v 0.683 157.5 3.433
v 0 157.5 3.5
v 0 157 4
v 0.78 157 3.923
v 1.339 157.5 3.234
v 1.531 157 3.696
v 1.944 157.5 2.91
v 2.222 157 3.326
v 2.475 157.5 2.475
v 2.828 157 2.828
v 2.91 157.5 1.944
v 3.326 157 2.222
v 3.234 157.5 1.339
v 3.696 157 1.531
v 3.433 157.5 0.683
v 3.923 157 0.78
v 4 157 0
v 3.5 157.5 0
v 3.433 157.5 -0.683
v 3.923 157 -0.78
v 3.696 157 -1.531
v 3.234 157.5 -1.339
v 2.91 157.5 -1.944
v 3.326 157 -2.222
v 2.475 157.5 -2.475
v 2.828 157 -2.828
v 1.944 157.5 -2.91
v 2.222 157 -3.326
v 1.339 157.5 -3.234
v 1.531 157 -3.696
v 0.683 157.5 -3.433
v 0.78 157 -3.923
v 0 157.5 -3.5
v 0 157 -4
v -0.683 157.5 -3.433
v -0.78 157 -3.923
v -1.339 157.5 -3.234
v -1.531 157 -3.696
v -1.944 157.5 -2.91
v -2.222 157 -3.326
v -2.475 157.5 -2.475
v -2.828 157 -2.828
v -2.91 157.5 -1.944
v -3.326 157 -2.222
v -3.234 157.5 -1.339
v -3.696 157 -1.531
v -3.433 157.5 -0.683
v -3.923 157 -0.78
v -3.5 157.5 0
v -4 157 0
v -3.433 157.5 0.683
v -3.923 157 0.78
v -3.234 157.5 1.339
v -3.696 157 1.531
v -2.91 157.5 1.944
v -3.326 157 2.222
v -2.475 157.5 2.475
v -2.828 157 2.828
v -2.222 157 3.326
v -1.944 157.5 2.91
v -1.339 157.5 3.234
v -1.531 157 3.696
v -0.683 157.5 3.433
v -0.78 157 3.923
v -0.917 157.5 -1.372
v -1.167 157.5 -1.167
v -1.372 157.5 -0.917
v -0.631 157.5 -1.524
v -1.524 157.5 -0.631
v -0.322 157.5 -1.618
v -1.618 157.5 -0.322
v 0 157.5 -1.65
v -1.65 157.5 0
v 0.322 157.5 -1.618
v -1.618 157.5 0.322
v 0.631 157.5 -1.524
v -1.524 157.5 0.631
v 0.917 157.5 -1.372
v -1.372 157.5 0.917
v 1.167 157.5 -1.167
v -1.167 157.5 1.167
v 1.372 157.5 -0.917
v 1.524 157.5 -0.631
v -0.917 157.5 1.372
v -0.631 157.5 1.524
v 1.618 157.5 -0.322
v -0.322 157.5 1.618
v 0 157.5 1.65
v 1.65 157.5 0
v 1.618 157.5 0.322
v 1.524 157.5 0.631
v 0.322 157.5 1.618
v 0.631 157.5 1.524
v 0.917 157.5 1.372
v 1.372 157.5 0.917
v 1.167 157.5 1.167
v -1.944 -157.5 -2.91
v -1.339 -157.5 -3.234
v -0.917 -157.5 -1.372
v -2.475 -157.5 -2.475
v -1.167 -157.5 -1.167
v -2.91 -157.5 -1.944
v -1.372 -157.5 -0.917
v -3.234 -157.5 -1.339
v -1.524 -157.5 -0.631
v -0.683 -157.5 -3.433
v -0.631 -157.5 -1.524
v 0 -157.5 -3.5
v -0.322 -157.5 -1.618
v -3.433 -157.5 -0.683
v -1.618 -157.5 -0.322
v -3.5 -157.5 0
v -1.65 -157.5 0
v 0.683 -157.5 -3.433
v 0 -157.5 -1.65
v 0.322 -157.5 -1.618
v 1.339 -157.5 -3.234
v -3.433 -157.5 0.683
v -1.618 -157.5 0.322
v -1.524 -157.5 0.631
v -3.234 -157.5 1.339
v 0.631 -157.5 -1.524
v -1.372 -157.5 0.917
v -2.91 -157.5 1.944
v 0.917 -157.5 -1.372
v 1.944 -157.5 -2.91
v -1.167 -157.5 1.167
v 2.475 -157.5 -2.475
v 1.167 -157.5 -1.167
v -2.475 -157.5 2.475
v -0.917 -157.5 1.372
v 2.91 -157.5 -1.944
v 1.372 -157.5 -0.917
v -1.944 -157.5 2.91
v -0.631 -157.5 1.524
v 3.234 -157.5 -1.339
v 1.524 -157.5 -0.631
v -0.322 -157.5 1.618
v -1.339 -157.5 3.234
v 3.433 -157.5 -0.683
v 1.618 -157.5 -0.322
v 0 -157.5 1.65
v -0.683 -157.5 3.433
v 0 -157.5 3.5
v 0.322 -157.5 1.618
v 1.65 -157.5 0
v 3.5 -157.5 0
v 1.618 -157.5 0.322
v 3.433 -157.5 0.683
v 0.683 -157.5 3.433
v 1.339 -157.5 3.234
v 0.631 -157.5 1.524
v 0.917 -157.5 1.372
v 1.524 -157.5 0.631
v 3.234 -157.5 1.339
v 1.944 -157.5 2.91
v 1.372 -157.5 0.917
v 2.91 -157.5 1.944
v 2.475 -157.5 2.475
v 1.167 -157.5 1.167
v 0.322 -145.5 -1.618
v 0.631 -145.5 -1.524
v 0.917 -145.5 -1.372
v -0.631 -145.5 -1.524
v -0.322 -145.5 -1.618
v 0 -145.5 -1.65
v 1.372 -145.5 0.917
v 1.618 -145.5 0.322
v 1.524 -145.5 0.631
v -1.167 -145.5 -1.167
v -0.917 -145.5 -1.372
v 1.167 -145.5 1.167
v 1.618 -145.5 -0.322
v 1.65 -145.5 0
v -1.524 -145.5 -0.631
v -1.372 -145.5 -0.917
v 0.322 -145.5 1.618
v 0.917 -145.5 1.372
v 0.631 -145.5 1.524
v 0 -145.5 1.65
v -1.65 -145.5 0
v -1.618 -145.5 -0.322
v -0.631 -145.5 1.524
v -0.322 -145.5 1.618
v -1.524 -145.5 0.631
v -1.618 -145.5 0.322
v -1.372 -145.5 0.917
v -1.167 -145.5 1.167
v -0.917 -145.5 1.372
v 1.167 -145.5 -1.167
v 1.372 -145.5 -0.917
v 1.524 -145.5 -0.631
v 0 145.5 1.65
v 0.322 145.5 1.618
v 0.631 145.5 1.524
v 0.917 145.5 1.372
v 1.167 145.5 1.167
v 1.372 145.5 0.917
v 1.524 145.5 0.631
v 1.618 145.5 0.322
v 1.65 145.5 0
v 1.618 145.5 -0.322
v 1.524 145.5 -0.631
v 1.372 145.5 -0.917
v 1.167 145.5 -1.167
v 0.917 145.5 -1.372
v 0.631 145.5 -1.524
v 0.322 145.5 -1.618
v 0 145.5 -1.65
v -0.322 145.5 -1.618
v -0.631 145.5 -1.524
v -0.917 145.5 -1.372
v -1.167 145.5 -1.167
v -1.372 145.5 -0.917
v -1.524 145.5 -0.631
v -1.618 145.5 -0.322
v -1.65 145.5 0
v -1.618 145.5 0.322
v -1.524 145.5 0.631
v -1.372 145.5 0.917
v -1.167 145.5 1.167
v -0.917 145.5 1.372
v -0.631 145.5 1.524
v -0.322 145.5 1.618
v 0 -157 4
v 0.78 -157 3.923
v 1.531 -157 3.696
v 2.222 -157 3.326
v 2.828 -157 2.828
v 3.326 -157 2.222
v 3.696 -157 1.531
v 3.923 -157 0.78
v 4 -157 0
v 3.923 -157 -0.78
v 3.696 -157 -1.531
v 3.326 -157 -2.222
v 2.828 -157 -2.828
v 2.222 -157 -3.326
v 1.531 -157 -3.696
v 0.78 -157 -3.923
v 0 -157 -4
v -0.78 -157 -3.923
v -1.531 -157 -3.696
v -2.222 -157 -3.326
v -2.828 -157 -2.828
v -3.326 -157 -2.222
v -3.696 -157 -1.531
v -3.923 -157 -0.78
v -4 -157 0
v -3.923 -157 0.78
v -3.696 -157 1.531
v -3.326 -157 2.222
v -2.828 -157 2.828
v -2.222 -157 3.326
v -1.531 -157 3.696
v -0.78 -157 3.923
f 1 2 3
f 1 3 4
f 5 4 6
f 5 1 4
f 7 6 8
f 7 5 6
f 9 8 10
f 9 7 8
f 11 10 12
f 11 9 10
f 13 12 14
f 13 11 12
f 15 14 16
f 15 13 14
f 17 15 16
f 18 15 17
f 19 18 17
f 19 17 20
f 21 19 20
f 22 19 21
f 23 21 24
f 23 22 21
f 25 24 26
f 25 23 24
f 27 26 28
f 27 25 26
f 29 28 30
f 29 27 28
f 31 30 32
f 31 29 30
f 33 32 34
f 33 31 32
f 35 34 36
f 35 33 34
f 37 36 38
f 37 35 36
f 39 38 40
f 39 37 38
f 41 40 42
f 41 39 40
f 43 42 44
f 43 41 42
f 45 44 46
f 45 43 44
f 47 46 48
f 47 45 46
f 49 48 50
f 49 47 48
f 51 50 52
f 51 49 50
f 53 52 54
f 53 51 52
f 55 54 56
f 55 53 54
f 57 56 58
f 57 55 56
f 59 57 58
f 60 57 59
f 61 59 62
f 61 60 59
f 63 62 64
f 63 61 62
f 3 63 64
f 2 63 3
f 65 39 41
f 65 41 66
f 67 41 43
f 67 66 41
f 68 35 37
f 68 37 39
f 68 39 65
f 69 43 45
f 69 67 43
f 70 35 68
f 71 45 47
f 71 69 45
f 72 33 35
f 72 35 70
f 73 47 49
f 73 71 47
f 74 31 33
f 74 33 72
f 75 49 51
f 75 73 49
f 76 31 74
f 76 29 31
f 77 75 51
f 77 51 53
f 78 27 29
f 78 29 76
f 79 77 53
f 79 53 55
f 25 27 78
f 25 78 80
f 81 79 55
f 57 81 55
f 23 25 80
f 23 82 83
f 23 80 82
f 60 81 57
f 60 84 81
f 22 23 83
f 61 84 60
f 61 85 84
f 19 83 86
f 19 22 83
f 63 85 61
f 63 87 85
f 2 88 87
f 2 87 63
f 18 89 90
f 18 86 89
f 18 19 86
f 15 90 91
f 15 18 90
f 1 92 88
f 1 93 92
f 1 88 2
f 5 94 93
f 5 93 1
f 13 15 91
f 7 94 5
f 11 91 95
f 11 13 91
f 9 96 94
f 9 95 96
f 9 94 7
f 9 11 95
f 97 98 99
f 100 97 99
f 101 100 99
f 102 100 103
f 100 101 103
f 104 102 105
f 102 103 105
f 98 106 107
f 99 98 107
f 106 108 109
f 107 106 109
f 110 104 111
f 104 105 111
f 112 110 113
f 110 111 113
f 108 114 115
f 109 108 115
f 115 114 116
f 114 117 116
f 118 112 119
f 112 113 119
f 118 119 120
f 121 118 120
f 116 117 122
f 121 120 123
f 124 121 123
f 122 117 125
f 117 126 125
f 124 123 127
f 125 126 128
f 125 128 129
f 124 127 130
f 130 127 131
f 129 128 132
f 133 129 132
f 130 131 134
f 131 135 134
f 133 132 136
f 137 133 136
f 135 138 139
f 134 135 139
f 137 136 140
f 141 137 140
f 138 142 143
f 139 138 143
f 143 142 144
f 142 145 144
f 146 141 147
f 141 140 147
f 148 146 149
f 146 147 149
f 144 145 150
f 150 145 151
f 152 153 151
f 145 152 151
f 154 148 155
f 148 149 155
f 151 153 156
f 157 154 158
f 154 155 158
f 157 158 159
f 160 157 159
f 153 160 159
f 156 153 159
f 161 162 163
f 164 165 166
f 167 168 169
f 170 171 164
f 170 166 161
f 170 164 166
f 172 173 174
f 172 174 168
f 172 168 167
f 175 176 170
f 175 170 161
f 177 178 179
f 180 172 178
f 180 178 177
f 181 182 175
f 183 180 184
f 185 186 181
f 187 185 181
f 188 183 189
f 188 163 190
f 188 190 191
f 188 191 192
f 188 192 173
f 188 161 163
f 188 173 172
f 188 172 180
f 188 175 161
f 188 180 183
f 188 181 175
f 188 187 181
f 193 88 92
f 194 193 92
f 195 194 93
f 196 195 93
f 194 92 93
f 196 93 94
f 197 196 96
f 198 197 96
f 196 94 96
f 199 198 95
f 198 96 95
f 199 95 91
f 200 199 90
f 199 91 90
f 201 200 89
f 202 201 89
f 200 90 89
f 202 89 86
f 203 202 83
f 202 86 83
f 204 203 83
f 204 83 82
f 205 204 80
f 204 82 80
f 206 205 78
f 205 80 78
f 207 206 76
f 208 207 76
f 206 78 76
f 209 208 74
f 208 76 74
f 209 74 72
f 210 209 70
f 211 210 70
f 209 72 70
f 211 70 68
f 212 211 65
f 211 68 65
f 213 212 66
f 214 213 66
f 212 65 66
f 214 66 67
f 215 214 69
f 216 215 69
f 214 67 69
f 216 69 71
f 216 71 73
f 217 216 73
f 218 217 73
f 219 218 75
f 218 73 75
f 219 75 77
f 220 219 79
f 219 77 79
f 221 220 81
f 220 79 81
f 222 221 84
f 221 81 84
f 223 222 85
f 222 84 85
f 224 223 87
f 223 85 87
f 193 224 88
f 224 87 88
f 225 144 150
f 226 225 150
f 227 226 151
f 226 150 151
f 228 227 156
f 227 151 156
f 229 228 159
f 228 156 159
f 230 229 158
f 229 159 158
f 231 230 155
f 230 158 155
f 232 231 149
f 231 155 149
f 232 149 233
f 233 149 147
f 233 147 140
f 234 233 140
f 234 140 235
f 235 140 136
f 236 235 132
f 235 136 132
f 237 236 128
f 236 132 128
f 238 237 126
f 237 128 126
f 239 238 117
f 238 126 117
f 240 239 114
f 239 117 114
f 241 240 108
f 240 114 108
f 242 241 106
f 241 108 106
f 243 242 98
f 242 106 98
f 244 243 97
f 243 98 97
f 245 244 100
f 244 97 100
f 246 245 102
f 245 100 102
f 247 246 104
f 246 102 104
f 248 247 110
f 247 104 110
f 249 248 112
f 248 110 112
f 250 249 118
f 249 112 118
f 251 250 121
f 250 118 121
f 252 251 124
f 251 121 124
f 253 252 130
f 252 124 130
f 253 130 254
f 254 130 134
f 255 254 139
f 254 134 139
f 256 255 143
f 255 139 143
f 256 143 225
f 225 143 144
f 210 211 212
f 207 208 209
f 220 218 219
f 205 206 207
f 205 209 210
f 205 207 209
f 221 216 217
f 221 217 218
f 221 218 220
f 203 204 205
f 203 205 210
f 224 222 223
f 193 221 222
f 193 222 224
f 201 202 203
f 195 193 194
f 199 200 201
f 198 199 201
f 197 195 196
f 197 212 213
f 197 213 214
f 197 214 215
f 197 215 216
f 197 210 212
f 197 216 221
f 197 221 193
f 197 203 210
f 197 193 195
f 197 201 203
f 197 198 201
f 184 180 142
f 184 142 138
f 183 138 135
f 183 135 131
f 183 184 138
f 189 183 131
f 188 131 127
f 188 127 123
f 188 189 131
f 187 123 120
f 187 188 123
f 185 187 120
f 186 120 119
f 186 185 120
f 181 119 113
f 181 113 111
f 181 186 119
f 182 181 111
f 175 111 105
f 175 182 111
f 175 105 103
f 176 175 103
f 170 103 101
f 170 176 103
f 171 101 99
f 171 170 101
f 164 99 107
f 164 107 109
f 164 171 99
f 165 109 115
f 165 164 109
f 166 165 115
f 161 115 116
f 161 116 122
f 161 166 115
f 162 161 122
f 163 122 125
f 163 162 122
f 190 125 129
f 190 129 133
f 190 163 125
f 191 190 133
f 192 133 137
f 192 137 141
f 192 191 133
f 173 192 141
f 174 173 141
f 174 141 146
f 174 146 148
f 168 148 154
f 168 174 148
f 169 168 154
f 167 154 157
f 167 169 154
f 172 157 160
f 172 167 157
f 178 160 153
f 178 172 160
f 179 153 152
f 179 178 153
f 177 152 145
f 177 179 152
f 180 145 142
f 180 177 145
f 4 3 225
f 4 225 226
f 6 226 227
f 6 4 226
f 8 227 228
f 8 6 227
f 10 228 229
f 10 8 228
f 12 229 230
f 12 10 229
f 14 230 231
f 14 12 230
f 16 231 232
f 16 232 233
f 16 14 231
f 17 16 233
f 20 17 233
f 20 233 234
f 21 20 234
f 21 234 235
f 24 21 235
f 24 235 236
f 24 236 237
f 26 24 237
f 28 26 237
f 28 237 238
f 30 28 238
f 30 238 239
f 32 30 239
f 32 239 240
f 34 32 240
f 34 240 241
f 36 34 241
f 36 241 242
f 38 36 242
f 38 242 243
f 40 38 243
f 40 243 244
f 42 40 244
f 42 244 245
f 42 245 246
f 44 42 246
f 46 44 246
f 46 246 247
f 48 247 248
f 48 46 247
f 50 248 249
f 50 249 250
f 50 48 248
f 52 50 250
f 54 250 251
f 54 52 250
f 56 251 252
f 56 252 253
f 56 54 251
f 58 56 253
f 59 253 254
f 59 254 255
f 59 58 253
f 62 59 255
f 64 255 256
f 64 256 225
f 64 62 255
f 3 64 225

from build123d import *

# Parameters (mm, degrees)
SKETCH1_R           = 4
BOSS_EXTRUDE1_DEPTH = 157.5
CHAMFER1_SIZE       = 0.5
SKETCH2_R           = 1.65
CUT_EXTRUDE1_DEPTH  = 12
CUT_EXTRUDE2_START  = -12
SKETCH3_R           = 1.65
CUT_EXTRUDE2_DEPTH  = 12


with BuildPart() as part:
    # Sketch1 → Boss-Extrude1 (new, symmetric)
    with BuildSketch(Plane(origin=(0, 0, 0), x_dir=(1, 0, 0), z_dir=(0, 1, 0))):
        with Locations(Location((0, 0, 0), (0, 0, 270))):
            Circle(SKETCH1_R)
    extrude(amount=BOSS_EXTRUDE1_DEPTH, both=True)

    # Chamfer1
    chamfer1_edges = [part.edges().sort_by_distance(p)[0] for p in [
        (0, -157.5, -4),
        (0, 157.5, -4),
    ]]
    chamfer(chamfer1_edges, length=CHAMFER1_SIZE)

    # Sketch2 → Cut-Extrude1 (cut)
    with BuildSketch(Plane(origin=(0, 157.5, 0), x_dir=(1, 0, 0), z_dir=(0, 1, 0))):
        with Locations(Location((0, 0, 0), (0, 0, 270))):
            Circle(SKETCH2_R)
    extrude(amount=-CUT_EXTRUDE1_DEPTH, mode=Mode.SUBTRACT)

    # Sketch3 → Cut-Extrude2 (cut)
    with BuildSketch(Plane.XZ.offset(157.5).offset(CUT_EXTRUDE2_START)):
        with Locations(Location((0, 0, 0), (0, 0, 90))):
            Circle(SKETCH3_R)
    extrude(amount=CUT_EXTRUDE2_DEPTH, mode=Mode.SUBTRACT)


solid = part.part
